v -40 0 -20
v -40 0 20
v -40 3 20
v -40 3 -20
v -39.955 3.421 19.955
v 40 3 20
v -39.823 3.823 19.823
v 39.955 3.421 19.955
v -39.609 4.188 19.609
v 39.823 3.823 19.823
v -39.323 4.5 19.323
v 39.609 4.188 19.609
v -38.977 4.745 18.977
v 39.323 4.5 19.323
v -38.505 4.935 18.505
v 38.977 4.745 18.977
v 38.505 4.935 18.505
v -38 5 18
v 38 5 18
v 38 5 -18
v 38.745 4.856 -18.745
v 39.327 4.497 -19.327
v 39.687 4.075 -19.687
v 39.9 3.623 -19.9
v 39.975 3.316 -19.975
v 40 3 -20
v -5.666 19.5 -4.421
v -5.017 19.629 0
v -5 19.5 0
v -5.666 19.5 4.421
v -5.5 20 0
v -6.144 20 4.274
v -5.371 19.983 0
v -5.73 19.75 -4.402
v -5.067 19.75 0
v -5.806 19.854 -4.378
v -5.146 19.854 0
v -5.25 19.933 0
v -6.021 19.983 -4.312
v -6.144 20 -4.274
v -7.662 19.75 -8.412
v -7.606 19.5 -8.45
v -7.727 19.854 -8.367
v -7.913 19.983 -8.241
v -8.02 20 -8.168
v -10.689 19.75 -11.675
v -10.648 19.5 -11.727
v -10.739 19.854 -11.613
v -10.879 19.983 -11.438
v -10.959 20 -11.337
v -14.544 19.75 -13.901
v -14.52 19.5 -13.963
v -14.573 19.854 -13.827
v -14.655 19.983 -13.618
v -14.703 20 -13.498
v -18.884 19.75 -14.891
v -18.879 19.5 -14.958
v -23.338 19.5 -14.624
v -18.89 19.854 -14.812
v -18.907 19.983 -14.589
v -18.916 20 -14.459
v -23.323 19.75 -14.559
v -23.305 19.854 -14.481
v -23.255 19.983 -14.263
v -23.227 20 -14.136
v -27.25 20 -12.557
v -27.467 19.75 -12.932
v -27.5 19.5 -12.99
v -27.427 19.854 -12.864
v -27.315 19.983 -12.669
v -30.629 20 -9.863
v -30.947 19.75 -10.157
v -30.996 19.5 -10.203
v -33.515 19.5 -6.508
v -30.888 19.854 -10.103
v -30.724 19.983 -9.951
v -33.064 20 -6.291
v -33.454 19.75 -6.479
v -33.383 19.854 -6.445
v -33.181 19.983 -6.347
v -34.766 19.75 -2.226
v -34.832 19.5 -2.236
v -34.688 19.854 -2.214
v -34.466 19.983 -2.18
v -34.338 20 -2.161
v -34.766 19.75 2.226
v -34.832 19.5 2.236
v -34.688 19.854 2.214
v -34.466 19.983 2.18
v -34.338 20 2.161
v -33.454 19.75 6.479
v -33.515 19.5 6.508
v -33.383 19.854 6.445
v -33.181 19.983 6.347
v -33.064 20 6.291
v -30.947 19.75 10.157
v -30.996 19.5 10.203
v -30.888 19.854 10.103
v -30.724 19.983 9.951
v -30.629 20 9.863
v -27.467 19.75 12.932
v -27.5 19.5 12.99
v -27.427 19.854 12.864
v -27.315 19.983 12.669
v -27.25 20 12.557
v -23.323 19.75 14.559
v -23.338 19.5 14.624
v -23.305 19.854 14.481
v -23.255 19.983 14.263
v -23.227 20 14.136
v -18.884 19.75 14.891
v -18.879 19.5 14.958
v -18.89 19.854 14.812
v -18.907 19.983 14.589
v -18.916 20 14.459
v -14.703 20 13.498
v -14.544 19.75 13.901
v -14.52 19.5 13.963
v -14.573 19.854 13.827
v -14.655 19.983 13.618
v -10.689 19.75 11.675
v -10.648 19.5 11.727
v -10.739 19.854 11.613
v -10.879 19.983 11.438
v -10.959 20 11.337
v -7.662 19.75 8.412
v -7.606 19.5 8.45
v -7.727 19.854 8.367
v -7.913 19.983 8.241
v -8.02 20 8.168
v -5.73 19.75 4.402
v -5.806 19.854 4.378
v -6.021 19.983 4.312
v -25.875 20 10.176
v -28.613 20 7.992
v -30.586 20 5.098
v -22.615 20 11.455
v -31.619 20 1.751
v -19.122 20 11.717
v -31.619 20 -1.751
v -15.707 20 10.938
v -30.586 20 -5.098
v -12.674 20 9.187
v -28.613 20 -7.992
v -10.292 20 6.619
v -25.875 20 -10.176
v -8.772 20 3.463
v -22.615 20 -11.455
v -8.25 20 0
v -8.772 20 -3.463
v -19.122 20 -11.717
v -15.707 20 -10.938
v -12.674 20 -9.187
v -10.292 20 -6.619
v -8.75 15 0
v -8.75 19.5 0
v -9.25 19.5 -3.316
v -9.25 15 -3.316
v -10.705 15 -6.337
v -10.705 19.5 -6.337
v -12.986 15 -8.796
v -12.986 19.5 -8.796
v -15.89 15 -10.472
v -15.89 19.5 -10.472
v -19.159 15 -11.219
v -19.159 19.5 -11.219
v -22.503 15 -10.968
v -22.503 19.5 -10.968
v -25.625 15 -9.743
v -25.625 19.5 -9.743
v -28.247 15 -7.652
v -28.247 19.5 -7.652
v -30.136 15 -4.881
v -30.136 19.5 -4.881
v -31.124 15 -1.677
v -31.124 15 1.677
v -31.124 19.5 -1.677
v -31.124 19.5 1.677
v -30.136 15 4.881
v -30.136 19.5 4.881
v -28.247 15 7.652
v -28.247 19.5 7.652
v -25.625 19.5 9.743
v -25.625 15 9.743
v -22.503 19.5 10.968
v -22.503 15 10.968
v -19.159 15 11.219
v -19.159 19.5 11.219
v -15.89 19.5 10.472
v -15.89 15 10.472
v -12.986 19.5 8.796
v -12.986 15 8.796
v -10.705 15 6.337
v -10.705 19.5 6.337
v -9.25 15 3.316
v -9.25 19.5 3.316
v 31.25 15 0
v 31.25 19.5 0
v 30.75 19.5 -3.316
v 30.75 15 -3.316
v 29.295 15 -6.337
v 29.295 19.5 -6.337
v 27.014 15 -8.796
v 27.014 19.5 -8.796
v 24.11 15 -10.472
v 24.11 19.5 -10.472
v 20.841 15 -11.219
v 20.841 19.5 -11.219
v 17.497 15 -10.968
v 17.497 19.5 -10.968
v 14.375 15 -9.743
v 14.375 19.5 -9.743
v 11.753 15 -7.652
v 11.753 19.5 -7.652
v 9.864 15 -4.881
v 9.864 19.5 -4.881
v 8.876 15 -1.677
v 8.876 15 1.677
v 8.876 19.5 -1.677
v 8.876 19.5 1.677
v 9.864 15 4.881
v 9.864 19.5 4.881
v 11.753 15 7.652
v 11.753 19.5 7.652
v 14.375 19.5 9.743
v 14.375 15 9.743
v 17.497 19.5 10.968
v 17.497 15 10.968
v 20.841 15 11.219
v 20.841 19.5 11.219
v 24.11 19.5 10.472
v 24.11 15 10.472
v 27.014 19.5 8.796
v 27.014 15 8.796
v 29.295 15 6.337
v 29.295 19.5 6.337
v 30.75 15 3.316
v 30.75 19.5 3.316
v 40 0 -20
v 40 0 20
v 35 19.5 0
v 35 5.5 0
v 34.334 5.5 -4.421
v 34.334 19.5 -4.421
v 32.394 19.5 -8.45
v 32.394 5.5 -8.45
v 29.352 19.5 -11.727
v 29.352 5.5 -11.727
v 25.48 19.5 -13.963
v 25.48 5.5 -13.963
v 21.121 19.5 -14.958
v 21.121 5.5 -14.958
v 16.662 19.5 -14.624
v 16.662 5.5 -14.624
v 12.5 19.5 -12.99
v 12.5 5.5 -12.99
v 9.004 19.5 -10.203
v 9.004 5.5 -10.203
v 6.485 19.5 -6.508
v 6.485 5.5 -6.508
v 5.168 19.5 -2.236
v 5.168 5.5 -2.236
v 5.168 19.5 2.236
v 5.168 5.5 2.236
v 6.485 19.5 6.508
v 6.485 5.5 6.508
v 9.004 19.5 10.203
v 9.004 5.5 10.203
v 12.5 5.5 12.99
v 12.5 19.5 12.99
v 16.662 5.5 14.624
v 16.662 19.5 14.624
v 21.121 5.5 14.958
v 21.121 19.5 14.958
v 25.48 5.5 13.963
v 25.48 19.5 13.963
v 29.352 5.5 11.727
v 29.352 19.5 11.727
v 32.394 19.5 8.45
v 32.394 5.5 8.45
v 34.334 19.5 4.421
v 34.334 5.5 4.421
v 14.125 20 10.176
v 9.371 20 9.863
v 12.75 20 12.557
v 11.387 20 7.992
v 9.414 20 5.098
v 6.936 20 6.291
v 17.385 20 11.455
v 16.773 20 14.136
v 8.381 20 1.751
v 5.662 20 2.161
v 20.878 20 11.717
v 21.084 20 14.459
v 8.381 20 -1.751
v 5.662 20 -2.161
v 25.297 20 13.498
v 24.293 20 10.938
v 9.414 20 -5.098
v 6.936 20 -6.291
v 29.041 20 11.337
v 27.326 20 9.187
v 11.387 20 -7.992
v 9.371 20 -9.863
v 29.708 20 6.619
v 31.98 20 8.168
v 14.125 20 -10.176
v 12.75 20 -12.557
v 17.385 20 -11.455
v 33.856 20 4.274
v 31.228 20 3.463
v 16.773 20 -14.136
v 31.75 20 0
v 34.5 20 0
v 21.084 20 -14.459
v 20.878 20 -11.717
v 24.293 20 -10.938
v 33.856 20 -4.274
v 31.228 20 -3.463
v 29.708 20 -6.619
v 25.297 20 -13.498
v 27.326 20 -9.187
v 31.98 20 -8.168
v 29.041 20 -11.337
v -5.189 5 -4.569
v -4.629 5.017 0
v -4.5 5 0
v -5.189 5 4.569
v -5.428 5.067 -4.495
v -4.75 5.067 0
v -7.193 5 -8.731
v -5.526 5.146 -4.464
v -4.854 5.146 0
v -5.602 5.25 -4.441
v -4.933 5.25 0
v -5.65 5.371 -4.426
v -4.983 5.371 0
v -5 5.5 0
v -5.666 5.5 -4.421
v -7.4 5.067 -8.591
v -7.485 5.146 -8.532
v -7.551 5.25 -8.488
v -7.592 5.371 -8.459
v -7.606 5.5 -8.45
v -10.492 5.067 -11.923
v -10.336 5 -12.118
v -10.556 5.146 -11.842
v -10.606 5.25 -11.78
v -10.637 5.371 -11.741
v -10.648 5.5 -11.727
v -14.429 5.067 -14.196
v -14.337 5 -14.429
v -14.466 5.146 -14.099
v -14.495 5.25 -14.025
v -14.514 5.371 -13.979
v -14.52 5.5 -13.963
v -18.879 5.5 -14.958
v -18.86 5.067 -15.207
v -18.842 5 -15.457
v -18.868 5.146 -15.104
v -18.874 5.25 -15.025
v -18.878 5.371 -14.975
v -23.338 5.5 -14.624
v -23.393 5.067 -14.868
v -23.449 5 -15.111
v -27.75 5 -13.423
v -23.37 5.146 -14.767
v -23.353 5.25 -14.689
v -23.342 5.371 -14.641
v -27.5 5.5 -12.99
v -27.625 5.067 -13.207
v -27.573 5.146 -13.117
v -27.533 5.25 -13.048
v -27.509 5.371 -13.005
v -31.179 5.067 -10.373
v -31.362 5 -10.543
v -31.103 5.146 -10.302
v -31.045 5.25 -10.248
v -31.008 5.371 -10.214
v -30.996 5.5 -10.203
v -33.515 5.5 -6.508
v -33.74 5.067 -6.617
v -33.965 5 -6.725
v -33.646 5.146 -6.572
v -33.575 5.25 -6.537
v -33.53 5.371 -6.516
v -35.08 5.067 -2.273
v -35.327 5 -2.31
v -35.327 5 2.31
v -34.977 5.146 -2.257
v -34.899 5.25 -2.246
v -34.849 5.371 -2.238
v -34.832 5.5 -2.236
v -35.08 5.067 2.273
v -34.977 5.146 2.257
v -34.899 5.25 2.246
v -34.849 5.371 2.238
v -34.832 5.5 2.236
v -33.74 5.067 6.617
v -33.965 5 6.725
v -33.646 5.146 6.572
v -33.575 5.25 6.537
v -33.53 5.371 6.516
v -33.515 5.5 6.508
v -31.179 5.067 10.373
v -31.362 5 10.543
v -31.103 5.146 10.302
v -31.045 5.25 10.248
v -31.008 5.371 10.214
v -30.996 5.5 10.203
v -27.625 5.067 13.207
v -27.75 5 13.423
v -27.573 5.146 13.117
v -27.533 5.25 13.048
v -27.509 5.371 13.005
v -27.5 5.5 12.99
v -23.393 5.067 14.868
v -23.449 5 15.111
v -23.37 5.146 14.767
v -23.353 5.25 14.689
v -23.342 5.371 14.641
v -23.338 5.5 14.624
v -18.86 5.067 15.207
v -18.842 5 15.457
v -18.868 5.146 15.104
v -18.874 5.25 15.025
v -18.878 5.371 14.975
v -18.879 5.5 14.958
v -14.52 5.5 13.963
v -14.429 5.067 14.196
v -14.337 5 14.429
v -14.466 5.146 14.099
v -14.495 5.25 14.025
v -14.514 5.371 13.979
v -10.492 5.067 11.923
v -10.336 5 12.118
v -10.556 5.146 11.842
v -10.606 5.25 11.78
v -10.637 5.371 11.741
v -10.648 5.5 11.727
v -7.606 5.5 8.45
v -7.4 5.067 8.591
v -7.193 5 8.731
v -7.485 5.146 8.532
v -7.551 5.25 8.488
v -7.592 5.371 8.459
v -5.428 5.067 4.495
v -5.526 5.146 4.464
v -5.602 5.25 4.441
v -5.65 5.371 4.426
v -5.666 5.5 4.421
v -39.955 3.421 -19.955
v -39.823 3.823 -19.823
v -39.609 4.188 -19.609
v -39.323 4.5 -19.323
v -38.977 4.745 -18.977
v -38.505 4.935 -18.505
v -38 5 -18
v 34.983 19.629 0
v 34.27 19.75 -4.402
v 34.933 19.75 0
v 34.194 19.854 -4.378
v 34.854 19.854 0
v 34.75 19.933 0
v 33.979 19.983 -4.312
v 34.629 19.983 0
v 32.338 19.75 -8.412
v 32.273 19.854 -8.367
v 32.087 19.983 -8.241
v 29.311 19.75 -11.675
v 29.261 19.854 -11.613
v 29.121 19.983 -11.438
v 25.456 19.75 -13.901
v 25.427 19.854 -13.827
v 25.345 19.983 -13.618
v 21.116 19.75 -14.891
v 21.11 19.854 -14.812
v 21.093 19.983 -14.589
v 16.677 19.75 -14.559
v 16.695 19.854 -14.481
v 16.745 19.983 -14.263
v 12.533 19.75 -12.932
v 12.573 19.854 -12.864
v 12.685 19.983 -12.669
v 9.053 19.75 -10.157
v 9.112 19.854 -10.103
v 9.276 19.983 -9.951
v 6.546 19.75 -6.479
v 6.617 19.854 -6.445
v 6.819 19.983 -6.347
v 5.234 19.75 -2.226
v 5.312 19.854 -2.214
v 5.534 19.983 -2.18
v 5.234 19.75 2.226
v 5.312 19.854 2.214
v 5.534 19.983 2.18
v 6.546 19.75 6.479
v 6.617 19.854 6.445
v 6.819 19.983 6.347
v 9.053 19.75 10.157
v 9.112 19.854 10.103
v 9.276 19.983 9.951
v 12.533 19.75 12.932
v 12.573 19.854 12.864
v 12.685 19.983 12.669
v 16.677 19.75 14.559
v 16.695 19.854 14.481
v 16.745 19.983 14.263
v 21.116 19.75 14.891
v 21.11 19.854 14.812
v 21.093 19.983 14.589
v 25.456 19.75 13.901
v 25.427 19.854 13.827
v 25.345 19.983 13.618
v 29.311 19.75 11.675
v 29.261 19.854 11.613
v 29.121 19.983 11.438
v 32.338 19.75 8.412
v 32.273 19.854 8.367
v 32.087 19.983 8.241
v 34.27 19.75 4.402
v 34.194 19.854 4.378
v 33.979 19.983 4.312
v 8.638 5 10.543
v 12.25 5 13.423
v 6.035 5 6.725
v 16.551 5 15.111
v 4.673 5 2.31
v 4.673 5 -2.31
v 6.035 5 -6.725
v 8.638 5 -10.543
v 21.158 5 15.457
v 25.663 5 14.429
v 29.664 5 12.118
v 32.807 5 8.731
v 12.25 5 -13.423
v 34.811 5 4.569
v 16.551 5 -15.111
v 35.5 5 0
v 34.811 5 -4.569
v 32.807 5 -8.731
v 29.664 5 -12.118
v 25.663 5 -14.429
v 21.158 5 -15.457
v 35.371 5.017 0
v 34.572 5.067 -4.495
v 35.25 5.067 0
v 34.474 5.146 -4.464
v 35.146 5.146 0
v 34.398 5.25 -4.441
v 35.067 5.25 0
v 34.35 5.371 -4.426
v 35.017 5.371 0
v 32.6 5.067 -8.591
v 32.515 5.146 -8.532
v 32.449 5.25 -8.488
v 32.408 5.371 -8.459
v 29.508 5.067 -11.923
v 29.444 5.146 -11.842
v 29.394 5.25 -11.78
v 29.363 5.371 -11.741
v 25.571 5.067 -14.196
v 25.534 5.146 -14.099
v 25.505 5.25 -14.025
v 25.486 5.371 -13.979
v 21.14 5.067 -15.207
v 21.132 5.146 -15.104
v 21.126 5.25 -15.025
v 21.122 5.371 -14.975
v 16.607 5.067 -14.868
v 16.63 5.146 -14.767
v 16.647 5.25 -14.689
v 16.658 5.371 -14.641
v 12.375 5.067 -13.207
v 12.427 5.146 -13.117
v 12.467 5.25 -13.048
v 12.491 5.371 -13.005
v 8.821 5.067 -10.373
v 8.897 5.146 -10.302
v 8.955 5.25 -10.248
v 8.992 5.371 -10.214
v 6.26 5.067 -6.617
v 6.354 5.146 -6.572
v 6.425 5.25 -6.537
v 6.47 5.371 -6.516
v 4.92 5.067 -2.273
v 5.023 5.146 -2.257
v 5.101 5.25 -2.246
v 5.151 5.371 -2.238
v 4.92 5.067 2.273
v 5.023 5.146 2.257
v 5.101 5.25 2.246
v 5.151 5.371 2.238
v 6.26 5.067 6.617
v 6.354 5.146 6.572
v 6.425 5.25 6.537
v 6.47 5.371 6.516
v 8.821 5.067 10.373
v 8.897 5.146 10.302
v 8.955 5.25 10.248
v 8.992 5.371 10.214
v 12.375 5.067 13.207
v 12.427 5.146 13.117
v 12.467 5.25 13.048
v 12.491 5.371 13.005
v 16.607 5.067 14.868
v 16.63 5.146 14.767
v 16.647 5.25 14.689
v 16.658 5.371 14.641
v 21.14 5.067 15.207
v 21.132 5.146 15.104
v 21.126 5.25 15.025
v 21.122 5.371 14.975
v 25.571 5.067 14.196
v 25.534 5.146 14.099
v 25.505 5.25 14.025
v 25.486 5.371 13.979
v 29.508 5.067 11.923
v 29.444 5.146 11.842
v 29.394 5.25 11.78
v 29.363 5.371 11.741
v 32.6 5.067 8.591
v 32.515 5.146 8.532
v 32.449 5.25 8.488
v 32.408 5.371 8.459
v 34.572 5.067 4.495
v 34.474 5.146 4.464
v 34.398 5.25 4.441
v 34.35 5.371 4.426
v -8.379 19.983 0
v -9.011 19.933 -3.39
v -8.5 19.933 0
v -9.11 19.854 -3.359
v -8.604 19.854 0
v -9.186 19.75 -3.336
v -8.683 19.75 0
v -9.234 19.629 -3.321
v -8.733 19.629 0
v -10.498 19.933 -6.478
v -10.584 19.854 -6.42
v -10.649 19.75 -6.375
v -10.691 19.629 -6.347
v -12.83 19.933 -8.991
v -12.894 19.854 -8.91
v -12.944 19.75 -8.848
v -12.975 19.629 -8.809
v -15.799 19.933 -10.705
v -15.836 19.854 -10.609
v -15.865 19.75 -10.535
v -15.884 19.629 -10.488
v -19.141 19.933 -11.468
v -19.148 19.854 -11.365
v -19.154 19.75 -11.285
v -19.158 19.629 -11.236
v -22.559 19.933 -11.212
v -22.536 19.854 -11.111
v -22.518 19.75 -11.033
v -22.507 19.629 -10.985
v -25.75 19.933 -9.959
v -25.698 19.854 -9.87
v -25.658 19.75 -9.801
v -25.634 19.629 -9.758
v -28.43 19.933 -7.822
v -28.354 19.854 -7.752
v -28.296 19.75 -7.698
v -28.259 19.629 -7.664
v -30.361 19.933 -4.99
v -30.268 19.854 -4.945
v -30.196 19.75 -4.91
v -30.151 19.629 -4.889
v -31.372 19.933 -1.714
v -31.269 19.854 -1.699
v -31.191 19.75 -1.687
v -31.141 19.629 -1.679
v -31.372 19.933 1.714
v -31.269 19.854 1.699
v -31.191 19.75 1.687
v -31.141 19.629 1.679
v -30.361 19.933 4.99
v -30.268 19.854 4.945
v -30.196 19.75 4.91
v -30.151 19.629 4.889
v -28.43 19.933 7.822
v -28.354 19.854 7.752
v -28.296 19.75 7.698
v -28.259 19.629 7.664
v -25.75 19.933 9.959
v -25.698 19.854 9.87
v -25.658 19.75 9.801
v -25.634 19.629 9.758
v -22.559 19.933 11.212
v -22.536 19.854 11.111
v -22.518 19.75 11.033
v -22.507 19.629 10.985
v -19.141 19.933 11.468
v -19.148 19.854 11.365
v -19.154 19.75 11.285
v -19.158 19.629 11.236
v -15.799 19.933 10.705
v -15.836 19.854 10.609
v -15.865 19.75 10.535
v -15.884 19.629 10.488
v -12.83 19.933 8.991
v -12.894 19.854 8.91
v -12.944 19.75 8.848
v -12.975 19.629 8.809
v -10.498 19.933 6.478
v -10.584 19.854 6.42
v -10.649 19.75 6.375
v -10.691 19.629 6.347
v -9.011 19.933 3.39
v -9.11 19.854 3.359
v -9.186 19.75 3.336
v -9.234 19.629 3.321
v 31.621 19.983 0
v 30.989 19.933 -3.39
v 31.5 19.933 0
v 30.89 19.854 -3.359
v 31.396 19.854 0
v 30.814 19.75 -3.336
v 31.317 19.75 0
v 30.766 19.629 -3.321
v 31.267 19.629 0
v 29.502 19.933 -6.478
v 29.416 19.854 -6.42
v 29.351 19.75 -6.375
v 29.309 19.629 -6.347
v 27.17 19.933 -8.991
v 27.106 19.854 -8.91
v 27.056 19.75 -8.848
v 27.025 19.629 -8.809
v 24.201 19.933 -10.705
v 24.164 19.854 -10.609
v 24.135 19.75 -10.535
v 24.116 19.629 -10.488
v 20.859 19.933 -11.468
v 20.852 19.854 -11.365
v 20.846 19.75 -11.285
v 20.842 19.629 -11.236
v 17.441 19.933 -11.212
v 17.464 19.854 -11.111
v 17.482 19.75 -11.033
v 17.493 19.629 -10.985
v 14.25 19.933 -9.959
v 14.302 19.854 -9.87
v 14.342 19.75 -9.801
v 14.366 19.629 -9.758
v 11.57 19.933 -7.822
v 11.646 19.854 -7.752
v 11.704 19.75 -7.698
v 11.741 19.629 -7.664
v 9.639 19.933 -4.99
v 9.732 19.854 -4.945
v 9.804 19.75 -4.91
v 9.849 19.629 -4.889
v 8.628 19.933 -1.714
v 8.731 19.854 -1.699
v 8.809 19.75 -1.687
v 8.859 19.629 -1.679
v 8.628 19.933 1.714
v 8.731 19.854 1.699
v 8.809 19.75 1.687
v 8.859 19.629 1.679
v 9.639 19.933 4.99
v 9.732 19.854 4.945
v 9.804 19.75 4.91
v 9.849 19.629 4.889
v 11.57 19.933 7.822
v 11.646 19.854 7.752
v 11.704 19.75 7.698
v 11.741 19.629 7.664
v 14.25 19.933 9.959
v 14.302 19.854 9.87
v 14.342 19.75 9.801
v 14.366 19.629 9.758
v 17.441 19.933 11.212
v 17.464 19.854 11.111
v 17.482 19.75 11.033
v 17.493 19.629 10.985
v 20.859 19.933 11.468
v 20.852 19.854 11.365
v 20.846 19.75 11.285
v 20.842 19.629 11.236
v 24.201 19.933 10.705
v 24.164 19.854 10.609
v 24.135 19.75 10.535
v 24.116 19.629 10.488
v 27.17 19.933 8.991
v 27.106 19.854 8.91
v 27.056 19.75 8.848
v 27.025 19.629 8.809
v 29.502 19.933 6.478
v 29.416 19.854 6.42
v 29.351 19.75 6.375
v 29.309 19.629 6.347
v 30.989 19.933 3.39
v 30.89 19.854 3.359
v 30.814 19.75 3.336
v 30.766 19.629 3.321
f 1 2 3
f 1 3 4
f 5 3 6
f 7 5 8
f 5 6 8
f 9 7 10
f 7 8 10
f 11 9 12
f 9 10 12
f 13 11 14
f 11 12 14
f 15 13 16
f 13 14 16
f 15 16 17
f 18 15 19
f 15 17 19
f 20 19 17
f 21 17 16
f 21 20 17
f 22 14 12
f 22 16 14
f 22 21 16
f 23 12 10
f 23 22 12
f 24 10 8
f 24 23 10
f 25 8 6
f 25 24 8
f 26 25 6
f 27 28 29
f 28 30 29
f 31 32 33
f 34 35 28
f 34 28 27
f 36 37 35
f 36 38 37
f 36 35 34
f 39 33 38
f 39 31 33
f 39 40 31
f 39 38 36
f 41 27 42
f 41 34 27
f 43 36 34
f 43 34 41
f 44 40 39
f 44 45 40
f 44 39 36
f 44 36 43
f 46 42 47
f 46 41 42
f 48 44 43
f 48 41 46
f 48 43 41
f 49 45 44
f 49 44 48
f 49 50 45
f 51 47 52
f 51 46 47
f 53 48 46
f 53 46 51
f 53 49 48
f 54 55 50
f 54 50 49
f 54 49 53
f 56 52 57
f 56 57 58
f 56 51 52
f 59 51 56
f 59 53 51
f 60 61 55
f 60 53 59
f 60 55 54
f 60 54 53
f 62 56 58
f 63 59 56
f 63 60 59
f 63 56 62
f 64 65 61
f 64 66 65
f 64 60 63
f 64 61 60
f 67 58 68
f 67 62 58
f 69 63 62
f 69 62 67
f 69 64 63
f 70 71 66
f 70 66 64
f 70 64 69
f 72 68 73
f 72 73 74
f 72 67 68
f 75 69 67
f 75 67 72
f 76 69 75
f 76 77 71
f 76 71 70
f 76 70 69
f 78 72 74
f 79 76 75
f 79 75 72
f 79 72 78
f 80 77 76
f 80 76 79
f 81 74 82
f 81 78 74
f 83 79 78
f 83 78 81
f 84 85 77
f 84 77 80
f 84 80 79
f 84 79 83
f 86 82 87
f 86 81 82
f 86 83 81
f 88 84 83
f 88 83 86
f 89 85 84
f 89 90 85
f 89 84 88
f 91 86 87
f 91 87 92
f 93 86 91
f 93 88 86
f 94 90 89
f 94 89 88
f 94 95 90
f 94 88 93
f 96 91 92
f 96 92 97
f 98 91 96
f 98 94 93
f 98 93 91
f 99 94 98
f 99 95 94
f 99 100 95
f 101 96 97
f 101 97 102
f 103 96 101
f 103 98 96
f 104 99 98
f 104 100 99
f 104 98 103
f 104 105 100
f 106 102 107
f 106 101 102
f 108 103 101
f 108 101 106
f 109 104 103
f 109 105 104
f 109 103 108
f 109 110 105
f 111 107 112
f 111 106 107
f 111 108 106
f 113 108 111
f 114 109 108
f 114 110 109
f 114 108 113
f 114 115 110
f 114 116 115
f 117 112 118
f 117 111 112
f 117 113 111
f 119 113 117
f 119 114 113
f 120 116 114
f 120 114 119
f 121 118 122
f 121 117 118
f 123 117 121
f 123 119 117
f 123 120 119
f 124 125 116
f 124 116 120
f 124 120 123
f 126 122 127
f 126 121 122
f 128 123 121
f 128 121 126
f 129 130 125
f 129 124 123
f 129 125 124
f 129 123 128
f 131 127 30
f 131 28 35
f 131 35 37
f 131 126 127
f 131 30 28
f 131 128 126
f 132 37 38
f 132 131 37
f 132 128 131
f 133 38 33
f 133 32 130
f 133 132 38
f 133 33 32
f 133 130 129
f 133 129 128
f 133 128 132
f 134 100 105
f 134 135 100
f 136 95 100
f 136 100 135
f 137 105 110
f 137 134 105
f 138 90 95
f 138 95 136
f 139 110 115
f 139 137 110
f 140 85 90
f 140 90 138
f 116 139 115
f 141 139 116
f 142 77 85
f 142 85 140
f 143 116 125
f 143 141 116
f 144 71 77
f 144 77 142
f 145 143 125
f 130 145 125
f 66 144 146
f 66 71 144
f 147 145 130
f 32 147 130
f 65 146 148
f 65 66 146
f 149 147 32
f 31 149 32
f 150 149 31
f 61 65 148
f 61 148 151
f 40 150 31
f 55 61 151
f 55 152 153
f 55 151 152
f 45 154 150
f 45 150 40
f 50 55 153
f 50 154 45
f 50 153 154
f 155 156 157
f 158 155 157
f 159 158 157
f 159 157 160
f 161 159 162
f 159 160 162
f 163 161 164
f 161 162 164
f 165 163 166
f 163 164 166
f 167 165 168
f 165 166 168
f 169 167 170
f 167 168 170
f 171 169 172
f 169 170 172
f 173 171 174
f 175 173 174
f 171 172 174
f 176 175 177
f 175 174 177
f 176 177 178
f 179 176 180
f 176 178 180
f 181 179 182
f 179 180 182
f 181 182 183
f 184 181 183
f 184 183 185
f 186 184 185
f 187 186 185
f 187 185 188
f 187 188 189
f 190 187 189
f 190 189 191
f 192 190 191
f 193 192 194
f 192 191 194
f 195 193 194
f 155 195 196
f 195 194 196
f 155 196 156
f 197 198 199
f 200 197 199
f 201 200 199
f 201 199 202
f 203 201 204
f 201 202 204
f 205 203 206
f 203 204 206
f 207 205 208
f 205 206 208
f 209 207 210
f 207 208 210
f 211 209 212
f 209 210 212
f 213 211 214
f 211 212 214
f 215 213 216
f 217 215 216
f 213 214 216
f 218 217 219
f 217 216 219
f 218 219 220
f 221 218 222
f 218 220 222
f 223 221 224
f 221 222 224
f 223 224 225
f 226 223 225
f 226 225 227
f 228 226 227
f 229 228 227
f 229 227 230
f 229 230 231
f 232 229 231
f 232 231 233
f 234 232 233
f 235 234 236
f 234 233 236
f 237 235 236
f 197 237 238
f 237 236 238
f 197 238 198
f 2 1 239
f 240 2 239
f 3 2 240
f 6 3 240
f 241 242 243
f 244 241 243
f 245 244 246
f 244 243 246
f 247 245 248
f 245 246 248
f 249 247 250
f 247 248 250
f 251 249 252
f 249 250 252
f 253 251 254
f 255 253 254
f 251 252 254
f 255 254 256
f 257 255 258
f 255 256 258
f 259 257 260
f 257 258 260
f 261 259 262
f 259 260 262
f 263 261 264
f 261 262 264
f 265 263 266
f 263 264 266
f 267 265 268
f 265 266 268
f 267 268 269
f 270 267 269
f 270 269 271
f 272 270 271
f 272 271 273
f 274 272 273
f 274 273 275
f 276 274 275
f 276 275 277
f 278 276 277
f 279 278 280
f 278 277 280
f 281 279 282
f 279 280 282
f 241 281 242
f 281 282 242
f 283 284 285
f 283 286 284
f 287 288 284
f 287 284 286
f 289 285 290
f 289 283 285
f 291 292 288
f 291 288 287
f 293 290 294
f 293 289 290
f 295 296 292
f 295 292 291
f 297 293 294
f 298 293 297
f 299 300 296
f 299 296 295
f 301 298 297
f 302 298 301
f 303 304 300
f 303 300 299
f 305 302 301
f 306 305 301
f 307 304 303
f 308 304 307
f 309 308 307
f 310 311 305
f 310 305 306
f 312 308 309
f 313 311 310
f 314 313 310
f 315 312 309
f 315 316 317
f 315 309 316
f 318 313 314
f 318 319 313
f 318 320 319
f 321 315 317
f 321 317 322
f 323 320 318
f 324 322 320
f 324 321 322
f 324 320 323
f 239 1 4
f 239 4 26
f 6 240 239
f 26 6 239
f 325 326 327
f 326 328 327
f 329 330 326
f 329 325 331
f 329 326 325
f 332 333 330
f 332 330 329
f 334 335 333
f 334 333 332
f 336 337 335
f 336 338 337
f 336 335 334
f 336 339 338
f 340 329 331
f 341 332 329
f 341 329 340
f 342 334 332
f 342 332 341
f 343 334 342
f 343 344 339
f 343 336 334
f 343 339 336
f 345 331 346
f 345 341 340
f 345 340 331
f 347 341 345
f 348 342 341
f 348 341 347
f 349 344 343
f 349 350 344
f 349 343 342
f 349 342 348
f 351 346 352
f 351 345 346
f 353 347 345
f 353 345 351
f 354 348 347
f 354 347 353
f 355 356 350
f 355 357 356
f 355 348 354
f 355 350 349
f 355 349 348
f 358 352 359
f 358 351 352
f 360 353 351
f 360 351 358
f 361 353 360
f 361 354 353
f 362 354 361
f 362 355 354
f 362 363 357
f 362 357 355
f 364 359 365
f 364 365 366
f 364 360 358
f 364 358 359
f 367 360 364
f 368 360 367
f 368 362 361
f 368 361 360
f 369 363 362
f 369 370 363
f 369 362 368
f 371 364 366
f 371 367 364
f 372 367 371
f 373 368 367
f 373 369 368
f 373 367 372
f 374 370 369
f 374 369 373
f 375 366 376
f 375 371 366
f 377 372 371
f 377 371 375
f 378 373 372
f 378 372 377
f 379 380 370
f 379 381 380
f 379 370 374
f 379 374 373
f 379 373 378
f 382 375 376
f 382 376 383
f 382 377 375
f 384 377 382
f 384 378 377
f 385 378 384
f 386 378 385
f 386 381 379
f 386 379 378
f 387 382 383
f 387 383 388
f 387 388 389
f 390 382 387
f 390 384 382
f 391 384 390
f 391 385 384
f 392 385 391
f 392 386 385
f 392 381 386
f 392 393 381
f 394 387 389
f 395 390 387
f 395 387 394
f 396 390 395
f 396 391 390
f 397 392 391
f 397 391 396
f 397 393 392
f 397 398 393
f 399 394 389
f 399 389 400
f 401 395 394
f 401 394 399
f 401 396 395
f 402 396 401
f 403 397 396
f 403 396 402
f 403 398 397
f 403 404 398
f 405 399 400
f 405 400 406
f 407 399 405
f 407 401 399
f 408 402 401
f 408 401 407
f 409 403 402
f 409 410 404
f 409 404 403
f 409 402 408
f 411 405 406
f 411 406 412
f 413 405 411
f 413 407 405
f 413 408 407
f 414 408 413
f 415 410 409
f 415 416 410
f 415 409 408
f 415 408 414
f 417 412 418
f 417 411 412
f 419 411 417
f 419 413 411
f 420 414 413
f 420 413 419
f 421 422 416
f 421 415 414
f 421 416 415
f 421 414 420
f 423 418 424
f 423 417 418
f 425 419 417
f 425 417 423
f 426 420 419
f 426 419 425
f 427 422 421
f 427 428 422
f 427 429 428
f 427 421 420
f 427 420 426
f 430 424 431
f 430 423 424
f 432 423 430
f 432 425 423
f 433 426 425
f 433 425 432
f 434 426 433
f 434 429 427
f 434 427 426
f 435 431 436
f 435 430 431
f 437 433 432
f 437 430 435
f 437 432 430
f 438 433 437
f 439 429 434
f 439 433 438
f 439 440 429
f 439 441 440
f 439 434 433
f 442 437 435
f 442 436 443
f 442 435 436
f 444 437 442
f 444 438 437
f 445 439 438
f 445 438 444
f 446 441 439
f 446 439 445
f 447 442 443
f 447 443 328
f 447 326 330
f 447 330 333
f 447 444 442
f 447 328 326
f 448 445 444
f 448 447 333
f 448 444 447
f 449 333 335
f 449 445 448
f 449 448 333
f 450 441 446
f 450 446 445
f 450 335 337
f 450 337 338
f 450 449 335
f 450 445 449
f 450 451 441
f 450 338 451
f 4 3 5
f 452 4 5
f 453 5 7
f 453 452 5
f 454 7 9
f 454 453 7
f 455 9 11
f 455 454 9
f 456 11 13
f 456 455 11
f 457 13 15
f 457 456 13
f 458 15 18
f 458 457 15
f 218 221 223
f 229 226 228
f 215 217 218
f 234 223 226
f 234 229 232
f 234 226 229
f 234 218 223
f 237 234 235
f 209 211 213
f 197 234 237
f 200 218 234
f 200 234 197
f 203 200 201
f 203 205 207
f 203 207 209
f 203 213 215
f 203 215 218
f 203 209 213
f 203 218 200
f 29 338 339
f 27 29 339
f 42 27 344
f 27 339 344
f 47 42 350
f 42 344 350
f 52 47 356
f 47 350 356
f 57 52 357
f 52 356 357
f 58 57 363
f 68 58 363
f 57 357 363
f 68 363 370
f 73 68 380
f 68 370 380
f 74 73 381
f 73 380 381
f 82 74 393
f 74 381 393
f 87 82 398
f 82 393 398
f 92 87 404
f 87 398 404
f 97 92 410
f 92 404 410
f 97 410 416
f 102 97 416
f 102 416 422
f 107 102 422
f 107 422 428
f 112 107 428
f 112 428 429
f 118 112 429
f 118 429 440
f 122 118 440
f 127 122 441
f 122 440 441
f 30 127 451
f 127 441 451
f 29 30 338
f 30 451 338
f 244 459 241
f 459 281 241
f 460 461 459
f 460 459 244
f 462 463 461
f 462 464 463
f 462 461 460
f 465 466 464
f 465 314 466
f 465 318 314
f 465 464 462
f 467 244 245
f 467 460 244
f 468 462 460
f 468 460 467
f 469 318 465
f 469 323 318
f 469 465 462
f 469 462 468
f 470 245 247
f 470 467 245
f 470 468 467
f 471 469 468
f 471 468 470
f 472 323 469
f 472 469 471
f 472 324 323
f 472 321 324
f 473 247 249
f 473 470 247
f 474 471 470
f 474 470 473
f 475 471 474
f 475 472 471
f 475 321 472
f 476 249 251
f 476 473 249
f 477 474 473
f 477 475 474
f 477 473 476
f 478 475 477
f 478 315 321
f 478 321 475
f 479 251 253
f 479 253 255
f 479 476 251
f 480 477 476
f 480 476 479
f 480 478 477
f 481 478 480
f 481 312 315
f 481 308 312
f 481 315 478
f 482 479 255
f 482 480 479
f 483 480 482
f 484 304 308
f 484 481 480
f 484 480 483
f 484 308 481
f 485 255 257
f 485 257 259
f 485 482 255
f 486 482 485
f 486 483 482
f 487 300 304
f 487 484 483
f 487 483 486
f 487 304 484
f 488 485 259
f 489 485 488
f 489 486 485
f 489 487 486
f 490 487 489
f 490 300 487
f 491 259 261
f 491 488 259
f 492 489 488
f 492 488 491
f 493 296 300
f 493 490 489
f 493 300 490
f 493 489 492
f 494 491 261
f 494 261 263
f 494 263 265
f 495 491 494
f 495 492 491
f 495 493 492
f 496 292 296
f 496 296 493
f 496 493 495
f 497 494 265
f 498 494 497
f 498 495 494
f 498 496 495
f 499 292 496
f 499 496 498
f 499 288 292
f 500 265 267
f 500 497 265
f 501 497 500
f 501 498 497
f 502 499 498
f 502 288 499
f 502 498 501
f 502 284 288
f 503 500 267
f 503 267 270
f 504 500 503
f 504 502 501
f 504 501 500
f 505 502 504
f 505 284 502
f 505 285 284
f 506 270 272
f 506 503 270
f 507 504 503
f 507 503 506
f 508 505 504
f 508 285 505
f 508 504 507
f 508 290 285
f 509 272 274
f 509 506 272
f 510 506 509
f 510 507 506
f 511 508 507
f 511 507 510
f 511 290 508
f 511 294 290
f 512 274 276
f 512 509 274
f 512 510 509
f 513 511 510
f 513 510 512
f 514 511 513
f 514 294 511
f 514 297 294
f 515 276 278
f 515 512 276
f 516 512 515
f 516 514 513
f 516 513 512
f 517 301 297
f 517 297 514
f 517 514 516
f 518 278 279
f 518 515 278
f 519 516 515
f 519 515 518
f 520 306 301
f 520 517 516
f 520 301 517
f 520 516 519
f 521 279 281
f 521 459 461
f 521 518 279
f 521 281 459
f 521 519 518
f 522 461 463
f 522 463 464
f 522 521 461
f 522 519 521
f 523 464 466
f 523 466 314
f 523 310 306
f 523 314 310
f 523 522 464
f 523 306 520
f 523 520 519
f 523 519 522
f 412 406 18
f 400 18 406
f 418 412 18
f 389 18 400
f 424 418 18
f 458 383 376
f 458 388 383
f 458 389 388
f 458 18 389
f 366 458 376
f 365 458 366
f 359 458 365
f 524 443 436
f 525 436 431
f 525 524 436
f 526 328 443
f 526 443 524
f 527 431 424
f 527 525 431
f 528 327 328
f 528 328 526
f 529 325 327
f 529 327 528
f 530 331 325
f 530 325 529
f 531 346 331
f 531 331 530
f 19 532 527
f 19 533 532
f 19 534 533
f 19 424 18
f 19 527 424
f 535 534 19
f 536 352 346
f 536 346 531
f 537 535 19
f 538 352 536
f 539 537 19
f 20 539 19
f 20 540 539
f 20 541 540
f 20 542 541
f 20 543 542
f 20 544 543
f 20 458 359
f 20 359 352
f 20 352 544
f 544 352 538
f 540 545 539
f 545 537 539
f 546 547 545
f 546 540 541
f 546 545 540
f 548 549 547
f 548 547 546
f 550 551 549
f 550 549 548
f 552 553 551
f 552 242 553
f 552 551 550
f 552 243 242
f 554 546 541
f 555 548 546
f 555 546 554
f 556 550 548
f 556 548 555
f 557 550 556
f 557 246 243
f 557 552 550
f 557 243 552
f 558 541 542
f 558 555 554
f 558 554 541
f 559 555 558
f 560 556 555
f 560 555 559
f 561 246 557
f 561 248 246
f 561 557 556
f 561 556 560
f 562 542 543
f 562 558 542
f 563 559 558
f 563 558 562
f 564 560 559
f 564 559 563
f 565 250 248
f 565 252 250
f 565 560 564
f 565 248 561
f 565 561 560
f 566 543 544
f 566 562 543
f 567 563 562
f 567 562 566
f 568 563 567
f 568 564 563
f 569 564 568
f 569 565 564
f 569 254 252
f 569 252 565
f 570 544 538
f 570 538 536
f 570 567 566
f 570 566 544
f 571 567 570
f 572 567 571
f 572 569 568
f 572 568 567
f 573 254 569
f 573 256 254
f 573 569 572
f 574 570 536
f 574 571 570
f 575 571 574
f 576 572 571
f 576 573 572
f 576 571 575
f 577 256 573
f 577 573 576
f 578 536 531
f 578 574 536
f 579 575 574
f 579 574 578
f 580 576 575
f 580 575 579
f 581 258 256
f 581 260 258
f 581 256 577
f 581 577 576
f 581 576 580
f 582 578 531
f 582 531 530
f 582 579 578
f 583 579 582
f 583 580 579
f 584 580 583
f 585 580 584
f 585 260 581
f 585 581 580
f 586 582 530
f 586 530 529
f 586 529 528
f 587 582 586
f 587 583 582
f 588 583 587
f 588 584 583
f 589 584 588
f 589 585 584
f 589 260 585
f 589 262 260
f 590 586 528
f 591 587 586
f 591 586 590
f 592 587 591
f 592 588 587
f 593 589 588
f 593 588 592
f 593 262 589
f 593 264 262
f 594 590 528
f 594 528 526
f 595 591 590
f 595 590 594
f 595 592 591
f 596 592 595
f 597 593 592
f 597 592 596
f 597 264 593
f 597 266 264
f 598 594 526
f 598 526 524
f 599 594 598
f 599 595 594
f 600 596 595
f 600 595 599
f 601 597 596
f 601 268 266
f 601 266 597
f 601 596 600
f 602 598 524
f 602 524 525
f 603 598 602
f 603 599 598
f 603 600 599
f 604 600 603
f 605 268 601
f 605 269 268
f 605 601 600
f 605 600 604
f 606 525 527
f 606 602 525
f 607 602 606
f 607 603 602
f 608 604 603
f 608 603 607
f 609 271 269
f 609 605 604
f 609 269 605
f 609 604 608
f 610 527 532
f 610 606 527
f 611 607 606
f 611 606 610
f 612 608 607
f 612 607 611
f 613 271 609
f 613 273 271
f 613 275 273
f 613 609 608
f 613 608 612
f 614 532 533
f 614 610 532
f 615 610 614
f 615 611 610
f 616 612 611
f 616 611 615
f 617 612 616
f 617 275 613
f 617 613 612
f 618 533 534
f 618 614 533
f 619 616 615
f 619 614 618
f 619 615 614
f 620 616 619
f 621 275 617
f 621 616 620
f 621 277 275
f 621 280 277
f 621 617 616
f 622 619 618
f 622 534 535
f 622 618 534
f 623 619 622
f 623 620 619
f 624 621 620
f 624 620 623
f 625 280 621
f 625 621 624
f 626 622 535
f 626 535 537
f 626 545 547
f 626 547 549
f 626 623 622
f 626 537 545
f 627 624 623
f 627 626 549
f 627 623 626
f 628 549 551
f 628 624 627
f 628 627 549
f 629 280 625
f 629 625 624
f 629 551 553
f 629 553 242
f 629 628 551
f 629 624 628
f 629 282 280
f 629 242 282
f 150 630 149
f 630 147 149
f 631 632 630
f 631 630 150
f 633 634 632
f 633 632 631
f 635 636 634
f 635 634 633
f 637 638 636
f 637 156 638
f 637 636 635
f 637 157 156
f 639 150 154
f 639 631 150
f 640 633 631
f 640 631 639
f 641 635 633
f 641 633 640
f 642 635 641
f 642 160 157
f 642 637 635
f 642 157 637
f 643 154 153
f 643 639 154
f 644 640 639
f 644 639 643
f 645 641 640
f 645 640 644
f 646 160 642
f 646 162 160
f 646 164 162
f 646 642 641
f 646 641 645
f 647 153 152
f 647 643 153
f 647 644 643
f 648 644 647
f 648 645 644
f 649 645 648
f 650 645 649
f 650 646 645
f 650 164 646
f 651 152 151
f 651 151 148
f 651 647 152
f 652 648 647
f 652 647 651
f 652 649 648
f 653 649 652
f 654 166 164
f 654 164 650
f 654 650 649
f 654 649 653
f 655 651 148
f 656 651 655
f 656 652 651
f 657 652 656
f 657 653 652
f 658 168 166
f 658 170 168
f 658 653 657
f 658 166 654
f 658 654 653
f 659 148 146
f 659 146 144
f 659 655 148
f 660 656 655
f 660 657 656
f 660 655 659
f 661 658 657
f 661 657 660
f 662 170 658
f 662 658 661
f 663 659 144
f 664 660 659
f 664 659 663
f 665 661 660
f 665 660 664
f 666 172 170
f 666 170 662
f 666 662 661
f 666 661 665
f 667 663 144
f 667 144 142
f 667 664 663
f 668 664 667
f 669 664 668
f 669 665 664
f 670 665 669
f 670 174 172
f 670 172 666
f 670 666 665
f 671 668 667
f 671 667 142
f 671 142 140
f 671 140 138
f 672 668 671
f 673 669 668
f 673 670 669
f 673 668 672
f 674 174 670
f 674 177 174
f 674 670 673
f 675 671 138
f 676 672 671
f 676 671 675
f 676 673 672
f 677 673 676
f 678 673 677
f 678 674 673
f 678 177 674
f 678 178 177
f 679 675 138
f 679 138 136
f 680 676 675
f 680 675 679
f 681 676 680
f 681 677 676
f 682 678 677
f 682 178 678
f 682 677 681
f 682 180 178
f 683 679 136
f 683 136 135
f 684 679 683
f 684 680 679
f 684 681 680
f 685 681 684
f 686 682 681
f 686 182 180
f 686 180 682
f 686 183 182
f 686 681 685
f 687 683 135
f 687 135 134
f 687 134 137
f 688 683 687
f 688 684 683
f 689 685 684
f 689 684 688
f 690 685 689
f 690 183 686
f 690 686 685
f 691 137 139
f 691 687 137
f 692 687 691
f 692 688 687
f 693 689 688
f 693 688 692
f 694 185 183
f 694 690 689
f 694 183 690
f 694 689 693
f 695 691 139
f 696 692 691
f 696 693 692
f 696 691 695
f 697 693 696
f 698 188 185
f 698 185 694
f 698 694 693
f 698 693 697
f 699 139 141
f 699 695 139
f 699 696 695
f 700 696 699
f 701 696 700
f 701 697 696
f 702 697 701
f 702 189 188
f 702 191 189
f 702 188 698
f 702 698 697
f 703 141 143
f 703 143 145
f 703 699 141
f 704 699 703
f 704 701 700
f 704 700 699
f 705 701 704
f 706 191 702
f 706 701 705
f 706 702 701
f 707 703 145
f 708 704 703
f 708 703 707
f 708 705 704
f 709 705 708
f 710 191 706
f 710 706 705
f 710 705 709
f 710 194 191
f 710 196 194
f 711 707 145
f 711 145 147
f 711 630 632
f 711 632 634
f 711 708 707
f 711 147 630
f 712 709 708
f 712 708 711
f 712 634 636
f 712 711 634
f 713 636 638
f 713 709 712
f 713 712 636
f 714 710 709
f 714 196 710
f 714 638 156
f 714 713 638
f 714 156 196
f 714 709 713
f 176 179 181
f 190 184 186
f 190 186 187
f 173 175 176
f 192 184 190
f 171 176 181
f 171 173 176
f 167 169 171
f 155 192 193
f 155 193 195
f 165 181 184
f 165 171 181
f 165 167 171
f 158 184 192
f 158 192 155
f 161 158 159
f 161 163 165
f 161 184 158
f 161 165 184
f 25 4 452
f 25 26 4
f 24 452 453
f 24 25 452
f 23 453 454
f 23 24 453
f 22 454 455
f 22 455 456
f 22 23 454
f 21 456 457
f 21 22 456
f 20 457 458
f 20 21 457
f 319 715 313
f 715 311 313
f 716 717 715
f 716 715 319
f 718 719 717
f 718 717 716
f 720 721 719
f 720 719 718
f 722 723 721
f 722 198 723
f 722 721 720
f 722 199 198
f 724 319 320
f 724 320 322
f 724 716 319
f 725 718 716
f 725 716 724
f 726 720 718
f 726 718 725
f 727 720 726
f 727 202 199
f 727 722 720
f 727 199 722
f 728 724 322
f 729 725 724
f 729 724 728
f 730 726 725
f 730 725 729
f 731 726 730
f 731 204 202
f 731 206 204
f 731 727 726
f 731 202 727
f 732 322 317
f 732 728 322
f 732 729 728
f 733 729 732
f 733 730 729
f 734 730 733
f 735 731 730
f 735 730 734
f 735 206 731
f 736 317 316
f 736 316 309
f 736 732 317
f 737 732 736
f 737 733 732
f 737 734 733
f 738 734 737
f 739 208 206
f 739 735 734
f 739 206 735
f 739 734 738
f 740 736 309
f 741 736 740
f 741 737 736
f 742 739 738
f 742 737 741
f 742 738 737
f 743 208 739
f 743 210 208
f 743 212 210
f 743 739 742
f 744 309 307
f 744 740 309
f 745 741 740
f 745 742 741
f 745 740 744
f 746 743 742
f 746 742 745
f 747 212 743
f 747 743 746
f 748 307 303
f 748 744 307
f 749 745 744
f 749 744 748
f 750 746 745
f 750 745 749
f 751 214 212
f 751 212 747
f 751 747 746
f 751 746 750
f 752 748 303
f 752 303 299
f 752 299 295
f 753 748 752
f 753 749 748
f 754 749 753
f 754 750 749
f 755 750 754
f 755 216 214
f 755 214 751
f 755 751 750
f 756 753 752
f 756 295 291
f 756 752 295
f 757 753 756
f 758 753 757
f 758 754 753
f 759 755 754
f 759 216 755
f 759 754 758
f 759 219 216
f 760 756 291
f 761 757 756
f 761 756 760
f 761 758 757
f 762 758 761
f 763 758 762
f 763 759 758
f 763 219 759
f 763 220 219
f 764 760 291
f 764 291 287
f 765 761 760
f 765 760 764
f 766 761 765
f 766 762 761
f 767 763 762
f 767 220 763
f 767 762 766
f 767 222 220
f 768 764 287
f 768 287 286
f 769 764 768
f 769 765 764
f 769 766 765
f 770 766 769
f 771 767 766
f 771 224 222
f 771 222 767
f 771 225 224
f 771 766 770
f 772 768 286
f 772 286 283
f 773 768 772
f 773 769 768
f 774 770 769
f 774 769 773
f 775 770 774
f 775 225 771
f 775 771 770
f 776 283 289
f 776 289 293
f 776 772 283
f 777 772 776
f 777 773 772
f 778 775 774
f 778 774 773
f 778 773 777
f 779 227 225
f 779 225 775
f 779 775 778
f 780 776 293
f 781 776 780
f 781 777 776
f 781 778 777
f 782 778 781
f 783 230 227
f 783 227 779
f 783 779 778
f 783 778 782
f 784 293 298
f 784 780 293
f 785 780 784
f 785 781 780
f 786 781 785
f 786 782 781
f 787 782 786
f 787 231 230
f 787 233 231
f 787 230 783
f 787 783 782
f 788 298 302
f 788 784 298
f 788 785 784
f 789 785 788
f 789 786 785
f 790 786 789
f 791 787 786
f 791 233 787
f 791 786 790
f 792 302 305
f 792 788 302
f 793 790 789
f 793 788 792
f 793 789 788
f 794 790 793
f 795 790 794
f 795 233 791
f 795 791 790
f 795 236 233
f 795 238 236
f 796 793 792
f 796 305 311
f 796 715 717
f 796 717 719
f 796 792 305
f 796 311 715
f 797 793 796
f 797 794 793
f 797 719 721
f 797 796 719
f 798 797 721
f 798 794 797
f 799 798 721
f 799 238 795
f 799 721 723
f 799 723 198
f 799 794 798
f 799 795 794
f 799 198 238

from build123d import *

# Parameters (mm, degrees)
SKETCH1_W           = 80
SKETCH1_H           = 40
BOSS_EXTRUDE1_DEPTH = 5
SKETCH2_R           = 15
BOSS_EXTRUDE2_DEPTH = 15
SKETCH3_R           = 11.25
CUT_EXTRUDE1_DEPTH  = 5
FILLET1_R           = 2
FILLET2_R           = 0.5


with BuildPart() as part:
    # Sketch1 → Boss-Extrude1 (new body)
    with BuildSketch(Plane(origin=(0, 0, 0), x_dir=(1, 0, 0), z_dir=(0, 1, 0))):
        Rectangle(SKETCH1_W, SKETCH1_H)
    extrude(amount=BOSS_EXTRUDE1_DEPTH)

    # Sketch2 → Boss-Extrude2 (add)
    with BuildSketch(Plane(origin=(0, 5, 0), x_dir=(1, 0, 0), z_dir=(0, 1, 0))):
        with Locations((-20, 0)):
            Circle(SKETCH2_R)
        with Locations((20, 0)):
            Circle(SKETCH2_R)
    extrude(amount=BOSS_EXTRUDE2_DEPTH)

    # Sketch3 → Cut-Extrude1 (cut)
    with BuildSketch(Plane(origin=(0, 20, 0), x_dir=(1, 0, 0), z_dir=(0, 1, 0))):
        with Locations((-20, 0)):
            Circle(SKETCH3_R)
        with Locations((20, 0)):
            Circle(SKETCH3_R)
    extrude(amount=-CUT_EXTRUDE1_DEPTH, mode=Mode.SUBTRACT)

    # Fillet1
    fillet1_edges = [part.edges().sort_by_distance(p)[0] for p in [
        (-40, 5, 0),
        (0, 5, 20),
        (40, 5, 0),
        (0, 5, -20),
    ]]
    fillet(fillet1_edges, radius=FILLET1_R)

    # Fillet2
    fillet2_edges = [part.edges().sort_by_distance(p)[0] for p in [
        (-35, 5, 0),
        (-35, 20, 0),
        (5, 5, 0),
        (5, 20, 0),
        (-31.25, 20, 0),
        (8.75, 20, 0),
    ]]
    fillet(fillet2_edges, radius=FILLET2_R)


solid = part.part
